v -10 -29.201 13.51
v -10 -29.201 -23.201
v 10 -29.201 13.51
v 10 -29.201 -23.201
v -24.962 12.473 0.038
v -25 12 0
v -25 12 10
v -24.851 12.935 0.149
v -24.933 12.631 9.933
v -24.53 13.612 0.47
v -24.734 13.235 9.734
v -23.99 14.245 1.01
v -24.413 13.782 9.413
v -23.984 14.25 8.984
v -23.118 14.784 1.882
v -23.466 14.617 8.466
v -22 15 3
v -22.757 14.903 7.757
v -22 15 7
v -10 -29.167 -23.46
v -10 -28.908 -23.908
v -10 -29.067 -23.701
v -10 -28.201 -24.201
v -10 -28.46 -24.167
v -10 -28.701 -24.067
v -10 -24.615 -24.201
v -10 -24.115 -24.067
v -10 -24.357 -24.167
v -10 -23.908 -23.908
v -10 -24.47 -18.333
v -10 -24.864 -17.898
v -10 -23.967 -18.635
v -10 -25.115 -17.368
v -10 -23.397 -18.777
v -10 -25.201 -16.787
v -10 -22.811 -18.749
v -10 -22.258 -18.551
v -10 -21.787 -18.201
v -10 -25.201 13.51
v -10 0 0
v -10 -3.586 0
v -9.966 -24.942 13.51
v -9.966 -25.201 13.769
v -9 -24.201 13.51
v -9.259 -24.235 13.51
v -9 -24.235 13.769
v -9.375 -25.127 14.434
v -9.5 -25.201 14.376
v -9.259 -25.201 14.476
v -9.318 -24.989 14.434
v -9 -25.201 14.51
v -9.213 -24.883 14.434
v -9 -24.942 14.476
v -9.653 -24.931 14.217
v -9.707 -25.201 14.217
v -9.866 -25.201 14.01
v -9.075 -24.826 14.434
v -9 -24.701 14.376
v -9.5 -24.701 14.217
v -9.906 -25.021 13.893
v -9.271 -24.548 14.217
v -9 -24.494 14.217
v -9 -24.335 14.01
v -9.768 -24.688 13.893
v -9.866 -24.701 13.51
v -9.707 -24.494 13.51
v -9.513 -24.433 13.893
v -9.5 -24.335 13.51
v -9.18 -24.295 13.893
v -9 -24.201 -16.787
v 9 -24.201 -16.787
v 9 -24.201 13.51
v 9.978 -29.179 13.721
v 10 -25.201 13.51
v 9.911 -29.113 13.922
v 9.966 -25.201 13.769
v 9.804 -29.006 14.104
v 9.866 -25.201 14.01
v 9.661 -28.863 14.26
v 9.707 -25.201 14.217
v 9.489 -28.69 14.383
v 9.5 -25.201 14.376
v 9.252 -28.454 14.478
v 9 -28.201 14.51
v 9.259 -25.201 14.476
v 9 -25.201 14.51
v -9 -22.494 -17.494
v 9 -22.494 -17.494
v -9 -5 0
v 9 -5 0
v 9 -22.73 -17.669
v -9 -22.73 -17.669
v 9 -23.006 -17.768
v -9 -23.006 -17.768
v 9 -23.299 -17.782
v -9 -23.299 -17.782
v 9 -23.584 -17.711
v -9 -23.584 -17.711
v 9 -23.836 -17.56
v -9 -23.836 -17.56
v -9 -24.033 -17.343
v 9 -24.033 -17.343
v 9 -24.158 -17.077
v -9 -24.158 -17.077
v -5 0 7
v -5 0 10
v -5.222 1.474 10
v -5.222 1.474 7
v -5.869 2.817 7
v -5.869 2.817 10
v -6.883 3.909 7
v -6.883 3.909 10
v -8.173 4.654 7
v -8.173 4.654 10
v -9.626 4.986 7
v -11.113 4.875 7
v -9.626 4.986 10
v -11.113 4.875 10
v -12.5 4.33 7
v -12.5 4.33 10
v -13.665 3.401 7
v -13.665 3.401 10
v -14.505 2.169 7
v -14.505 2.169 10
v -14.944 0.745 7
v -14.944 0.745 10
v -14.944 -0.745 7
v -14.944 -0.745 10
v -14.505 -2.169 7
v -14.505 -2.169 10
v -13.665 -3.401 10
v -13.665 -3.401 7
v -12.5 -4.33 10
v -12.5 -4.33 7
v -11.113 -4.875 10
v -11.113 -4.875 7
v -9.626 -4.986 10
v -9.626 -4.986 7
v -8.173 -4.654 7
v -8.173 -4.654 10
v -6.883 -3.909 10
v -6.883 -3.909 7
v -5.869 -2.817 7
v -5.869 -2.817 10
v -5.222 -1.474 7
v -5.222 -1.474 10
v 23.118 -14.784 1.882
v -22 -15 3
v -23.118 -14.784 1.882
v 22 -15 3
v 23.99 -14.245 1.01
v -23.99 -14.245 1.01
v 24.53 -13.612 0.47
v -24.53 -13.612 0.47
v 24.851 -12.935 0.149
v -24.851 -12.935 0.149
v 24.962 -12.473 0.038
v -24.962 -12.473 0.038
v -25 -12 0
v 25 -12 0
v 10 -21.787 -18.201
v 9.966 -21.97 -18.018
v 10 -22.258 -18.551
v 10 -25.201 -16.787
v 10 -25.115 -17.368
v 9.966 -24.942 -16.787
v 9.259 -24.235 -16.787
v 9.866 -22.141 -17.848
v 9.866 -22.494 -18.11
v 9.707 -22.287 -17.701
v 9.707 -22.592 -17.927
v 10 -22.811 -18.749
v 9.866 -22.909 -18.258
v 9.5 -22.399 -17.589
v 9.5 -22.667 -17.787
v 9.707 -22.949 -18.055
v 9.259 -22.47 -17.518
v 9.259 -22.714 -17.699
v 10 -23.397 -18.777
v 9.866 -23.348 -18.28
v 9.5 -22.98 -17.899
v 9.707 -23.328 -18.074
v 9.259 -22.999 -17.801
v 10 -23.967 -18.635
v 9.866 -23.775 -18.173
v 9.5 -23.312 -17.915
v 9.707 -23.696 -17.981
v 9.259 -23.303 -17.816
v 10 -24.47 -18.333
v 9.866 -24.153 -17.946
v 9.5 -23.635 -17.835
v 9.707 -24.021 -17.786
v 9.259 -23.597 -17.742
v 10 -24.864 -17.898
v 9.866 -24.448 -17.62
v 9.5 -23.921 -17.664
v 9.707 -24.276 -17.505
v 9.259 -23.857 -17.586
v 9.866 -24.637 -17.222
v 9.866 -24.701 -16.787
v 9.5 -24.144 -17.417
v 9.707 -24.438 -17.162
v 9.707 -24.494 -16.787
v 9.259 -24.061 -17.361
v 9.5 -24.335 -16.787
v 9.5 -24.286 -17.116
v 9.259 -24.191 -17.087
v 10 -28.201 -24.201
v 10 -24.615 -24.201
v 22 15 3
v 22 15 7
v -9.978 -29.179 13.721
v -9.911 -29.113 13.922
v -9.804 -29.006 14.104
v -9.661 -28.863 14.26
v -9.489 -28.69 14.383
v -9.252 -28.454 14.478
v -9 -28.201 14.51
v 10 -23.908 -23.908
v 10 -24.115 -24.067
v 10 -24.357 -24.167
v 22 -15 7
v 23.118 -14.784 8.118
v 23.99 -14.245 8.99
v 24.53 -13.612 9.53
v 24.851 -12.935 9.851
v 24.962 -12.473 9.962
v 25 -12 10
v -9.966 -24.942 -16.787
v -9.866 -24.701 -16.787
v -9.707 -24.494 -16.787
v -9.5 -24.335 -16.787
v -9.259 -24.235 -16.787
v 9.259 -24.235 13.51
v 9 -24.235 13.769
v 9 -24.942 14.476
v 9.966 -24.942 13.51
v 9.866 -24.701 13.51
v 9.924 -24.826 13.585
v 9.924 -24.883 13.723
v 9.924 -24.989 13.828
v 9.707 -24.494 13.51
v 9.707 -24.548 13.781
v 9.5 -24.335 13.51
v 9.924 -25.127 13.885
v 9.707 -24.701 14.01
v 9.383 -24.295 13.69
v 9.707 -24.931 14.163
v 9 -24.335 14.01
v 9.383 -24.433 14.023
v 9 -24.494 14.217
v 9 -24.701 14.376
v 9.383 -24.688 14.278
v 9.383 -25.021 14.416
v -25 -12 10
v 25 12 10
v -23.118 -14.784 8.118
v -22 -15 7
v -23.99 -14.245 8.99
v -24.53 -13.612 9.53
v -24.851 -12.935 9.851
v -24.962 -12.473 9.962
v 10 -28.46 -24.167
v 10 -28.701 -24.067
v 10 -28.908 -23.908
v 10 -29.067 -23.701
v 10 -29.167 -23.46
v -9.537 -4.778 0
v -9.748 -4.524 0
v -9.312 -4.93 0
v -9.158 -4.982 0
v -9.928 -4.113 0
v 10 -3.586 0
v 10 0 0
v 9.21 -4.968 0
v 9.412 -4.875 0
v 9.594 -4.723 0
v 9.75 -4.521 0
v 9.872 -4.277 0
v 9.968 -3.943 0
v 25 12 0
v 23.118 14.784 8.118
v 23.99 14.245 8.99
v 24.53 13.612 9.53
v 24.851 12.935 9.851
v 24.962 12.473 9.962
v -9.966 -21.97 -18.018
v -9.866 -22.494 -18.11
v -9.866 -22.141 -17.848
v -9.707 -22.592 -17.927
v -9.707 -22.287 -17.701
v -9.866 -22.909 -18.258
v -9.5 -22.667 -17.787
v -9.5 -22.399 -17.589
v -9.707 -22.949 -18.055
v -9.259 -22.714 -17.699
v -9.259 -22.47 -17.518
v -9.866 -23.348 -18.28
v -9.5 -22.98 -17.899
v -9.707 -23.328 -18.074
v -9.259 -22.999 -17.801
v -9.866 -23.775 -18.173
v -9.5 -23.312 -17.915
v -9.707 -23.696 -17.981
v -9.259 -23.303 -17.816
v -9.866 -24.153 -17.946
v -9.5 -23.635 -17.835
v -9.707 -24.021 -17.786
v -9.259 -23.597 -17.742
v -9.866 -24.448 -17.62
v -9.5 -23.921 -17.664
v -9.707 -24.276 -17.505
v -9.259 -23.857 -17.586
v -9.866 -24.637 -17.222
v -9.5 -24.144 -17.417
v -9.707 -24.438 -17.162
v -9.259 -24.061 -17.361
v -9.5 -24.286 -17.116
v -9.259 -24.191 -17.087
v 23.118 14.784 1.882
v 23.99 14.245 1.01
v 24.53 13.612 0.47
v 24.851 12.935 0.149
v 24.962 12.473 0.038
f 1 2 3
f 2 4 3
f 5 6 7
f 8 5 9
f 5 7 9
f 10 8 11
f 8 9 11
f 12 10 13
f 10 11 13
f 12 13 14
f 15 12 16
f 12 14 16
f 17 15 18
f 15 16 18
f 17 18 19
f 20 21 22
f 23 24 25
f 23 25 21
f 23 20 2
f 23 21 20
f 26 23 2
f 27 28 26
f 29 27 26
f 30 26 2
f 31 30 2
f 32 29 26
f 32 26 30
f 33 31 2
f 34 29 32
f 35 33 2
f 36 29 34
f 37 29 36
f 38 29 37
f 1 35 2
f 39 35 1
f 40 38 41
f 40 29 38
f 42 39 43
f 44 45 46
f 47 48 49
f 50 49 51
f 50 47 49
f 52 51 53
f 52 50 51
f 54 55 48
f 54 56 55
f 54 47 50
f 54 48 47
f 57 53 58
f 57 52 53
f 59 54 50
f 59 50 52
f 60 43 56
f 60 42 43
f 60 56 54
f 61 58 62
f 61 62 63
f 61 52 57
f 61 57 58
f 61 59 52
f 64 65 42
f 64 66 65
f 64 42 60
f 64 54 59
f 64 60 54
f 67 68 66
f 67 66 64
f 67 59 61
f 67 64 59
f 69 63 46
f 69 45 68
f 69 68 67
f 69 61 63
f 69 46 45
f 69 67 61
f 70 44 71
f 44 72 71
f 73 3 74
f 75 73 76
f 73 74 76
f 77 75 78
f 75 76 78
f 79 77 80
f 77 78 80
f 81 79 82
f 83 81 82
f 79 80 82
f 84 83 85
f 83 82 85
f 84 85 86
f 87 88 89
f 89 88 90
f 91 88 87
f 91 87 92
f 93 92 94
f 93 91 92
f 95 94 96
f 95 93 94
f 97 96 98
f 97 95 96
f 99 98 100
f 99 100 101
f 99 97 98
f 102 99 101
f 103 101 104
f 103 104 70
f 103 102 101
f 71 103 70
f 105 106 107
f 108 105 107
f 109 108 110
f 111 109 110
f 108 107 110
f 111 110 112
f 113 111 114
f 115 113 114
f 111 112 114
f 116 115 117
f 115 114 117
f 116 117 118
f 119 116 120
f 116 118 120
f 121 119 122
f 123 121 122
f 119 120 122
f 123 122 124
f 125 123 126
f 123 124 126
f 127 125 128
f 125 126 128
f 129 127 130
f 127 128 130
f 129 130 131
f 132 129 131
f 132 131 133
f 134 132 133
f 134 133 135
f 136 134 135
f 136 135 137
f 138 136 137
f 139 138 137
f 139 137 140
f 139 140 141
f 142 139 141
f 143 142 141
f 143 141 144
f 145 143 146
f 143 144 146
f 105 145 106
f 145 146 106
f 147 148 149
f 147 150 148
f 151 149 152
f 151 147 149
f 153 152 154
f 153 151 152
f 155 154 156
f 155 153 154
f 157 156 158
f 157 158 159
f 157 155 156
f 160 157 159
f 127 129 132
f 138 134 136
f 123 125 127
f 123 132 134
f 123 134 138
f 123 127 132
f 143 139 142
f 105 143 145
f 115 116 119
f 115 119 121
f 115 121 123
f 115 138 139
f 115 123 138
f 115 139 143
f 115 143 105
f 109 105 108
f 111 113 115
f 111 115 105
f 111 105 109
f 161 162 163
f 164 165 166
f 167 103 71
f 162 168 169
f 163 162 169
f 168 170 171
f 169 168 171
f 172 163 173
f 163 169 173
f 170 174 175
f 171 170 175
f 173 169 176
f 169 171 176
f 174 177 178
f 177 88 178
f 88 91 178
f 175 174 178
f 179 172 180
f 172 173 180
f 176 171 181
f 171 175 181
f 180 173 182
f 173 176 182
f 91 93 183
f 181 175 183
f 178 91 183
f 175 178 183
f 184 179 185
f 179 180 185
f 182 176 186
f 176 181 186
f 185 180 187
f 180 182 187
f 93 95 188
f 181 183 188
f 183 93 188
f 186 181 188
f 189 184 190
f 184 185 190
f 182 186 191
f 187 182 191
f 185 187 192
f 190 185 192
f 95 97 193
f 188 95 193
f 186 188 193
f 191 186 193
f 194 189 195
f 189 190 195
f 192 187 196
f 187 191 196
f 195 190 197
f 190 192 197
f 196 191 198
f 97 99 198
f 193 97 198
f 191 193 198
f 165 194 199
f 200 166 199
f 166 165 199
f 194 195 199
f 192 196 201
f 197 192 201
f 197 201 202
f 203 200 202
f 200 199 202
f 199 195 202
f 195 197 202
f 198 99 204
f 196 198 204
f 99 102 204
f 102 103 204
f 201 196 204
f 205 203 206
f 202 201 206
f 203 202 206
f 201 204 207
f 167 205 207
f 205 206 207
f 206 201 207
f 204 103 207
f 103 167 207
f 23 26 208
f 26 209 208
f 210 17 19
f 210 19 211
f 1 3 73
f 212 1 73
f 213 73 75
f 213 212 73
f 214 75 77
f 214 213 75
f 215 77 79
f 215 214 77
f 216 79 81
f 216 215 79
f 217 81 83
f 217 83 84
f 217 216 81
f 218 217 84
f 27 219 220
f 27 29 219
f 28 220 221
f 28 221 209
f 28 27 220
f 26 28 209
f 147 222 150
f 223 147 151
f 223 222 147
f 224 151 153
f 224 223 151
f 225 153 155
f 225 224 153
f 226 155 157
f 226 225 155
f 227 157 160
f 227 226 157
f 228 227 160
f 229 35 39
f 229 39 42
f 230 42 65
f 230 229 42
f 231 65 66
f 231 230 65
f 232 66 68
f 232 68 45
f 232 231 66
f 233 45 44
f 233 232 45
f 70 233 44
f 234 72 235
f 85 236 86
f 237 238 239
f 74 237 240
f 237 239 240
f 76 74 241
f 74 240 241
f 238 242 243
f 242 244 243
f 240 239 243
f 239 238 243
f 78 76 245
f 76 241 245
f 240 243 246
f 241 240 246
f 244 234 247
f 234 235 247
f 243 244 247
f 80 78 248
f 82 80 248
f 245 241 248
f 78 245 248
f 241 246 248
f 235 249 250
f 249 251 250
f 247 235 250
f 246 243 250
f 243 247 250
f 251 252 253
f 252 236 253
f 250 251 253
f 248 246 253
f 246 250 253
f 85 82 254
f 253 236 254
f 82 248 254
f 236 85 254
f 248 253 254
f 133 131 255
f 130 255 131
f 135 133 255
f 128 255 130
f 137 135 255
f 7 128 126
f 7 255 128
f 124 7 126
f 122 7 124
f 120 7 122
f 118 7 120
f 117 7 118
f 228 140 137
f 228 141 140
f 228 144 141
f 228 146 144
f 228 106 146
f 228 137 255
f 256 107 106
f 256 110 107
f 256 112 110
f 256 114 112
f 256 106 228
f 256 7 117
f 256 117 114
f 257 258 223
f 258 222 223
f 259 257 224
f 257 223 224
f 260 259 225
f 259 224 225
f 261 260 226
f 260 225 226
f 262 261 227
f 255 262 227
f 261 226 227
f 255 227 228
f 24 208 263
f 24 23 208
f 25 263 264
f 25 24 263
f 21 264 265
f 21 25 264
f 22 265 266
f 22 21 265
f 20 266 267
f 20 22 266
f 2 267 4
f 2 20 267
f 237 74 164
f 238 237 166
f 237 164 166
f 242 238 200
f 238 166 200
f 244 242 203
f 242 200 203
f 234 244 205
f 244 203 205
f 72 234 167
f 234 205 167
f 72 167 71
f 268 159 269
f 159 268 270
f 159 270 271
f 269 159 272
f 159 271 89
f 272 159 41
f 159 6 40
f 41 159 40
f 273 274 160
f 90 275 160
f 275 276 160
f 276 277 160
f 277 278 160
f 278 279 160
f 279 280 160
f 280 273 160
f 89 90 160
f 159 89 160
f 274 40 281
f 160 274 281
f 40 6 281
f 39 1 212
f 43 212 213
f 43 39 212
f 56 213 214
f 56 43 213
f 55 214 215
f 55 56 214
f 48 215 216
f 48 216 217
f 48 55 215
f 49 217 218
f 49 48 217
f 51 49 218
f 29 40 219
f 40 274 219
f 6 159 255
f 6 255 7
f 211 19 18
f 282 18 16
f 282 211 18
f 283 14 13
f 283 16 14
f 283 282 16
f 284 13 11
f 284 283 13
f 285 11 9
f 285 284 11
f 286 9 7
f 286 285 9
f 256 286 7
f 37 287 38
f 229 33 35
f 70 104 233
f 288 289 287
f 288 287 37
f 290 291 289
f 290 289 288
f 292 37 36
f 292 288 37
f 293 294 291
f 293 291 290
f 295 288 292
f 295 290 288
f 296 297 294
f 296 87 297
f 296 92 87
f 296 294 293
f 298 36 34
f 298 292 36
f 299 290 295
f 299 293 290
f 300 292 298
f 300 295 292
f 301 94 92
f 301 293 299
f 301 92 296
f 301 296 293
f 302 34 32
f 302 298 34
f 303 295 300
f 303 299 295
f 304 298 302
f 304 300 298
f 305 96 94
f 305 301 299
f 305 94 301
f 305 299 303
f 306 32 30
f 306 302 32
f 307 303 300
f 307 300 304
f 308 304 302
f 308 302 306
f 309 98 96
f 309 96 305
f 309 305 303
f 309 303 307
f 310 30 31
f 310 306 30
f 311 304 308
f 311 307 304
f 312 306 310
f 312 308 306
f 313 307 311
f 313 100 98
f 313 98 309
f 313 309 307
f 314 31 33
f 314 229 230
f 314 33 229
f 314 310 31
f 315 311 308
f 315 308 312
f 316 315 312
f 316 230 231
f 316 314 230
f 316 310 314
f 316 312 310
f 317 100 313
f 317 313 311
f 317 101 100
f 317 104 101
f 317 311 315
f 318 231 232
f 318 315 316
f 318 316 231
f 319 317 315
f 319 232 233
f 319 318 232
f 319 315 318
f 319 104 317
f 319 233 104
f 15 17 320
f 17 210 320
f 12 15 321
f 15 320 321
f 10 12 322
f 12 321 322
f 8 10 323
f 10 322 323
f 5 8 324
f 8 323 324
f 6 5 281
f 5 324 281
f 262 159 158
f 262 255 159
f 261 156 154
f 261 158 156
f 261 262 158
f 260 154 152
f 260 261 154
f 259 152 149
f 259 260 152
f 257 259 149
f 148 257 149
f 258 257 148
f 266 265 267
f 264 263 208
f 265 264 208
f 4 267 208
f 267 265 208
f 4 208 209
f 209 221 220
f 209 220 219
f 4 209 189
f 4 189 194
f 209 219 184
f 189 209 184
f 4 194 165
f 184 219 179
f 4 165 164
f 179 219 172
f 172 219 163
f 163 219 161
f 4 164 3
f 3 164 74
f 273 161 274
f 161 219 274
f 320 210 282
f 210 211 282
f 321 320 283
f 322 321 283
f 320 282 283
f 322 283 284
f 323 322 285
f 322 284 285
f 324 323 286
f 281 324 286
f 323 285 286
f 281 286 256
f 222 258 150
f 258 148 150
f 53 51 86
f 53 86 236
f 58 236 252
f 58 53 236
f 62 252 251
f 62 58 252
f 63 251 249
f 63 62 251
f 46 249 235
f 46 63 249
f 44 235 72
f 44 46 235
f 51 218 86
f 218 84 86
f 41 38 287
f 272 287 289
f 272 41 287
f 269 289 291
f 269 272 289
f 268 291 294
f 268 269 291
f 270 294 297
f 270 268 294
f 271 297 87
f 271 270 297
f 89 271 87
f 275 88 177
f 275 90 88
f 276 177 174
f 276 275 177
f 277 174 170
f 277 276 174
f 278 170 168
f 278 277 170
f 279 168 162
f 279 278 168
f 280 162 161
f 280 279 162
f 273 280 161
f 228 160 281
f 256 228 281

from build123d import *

# Parameters (mm, degrees)
SKETCH_1_W          = 50
SKETCH_1_H          = 30
EXTRUDE_1_DEPTH     = 10
EXTRUDE_2_DEPTH     = 10
SKETCH_3_R          = 5
CUT_EXTRUDE_1_DEPTH = 3
FILLET_1_R          = 3
FILLET_2_R          = 1


with BuildPart() as part:
    # 스케치1 → 보스-돌출1 (new body)
    with BuildSketch(Plane.XY):
        Rectangle(SKETCH_1_W, SKETCH_1_H)
    extrude(amount=EXTRUDE_1_DEPTH)

    # 스케치2 → 보스-돌출2 (add, symmetric)
    with BuildSketch(Plane(origin=(0, 0, 0), x_dir=(0, 0, -1), z_dir=(1, 0, 0))):
        Polygon((0, 0), (24.201197656, -24.201197656), (24.201197656, -29.201197656), (-14.510049854, -29.201197656), (-14.510049854, -24.201197656), (19.201197656, -24.201197656), (0, -5), align=None)
    extrude(amount=EXTRUDE_2_DEPTH, both=True)

    # 스케치3 → 컷-돌출1 (cut)
    with BuildSketch(Plane.XY.offset(10)):
        with Locations((-10, 0)):
            Circle(SKETCH_3_R)
    extrude(amount=-CUT_EXTRUDE_1_DEPTH, mode=Mode.SUBTRACT)

    # 필렛1
    fillet_1_edges = [part.edges().sort_by_distance(p)[0] for p in [
        (0, -15, 10),
        (0, -15, 0),
        (0, 15, 0),
        (25, -15, 5),
        (-25, -15, 5),
        (-25, 15, 5),
        (25, 15, 5),
        (0, 15, 10),
    ]]
    fillet(fillet_1_edges, radius=FILLET_1_R)

    # 필렛2
    fillet_2_edges = [part.edges().sort_by_distance(p)[0] for p in [
        (-10, -14.600598828, -9.600598828),
        (-10, -24.201197656, -2.345573901),
        (0, -24.201197656, -19.201197656),
        (-10, -26.701197656, 14.510049854),
        (0, -24.201197656, 14.510049854),
        (0, -29.201197656, 14.510049854),
        (0, -29.201197656, -24.201197656),
        (0, -24.201197656, -24.201197656),
        (10, -14.600598828, -9.600598828),
        (10, -24.201197656, -2.345573901),
        (10, -26.701197656, 14.510049854),
    ]]
    fillet(fillet_2_edges, radius=FILLET_2_R)


solid = part.part
